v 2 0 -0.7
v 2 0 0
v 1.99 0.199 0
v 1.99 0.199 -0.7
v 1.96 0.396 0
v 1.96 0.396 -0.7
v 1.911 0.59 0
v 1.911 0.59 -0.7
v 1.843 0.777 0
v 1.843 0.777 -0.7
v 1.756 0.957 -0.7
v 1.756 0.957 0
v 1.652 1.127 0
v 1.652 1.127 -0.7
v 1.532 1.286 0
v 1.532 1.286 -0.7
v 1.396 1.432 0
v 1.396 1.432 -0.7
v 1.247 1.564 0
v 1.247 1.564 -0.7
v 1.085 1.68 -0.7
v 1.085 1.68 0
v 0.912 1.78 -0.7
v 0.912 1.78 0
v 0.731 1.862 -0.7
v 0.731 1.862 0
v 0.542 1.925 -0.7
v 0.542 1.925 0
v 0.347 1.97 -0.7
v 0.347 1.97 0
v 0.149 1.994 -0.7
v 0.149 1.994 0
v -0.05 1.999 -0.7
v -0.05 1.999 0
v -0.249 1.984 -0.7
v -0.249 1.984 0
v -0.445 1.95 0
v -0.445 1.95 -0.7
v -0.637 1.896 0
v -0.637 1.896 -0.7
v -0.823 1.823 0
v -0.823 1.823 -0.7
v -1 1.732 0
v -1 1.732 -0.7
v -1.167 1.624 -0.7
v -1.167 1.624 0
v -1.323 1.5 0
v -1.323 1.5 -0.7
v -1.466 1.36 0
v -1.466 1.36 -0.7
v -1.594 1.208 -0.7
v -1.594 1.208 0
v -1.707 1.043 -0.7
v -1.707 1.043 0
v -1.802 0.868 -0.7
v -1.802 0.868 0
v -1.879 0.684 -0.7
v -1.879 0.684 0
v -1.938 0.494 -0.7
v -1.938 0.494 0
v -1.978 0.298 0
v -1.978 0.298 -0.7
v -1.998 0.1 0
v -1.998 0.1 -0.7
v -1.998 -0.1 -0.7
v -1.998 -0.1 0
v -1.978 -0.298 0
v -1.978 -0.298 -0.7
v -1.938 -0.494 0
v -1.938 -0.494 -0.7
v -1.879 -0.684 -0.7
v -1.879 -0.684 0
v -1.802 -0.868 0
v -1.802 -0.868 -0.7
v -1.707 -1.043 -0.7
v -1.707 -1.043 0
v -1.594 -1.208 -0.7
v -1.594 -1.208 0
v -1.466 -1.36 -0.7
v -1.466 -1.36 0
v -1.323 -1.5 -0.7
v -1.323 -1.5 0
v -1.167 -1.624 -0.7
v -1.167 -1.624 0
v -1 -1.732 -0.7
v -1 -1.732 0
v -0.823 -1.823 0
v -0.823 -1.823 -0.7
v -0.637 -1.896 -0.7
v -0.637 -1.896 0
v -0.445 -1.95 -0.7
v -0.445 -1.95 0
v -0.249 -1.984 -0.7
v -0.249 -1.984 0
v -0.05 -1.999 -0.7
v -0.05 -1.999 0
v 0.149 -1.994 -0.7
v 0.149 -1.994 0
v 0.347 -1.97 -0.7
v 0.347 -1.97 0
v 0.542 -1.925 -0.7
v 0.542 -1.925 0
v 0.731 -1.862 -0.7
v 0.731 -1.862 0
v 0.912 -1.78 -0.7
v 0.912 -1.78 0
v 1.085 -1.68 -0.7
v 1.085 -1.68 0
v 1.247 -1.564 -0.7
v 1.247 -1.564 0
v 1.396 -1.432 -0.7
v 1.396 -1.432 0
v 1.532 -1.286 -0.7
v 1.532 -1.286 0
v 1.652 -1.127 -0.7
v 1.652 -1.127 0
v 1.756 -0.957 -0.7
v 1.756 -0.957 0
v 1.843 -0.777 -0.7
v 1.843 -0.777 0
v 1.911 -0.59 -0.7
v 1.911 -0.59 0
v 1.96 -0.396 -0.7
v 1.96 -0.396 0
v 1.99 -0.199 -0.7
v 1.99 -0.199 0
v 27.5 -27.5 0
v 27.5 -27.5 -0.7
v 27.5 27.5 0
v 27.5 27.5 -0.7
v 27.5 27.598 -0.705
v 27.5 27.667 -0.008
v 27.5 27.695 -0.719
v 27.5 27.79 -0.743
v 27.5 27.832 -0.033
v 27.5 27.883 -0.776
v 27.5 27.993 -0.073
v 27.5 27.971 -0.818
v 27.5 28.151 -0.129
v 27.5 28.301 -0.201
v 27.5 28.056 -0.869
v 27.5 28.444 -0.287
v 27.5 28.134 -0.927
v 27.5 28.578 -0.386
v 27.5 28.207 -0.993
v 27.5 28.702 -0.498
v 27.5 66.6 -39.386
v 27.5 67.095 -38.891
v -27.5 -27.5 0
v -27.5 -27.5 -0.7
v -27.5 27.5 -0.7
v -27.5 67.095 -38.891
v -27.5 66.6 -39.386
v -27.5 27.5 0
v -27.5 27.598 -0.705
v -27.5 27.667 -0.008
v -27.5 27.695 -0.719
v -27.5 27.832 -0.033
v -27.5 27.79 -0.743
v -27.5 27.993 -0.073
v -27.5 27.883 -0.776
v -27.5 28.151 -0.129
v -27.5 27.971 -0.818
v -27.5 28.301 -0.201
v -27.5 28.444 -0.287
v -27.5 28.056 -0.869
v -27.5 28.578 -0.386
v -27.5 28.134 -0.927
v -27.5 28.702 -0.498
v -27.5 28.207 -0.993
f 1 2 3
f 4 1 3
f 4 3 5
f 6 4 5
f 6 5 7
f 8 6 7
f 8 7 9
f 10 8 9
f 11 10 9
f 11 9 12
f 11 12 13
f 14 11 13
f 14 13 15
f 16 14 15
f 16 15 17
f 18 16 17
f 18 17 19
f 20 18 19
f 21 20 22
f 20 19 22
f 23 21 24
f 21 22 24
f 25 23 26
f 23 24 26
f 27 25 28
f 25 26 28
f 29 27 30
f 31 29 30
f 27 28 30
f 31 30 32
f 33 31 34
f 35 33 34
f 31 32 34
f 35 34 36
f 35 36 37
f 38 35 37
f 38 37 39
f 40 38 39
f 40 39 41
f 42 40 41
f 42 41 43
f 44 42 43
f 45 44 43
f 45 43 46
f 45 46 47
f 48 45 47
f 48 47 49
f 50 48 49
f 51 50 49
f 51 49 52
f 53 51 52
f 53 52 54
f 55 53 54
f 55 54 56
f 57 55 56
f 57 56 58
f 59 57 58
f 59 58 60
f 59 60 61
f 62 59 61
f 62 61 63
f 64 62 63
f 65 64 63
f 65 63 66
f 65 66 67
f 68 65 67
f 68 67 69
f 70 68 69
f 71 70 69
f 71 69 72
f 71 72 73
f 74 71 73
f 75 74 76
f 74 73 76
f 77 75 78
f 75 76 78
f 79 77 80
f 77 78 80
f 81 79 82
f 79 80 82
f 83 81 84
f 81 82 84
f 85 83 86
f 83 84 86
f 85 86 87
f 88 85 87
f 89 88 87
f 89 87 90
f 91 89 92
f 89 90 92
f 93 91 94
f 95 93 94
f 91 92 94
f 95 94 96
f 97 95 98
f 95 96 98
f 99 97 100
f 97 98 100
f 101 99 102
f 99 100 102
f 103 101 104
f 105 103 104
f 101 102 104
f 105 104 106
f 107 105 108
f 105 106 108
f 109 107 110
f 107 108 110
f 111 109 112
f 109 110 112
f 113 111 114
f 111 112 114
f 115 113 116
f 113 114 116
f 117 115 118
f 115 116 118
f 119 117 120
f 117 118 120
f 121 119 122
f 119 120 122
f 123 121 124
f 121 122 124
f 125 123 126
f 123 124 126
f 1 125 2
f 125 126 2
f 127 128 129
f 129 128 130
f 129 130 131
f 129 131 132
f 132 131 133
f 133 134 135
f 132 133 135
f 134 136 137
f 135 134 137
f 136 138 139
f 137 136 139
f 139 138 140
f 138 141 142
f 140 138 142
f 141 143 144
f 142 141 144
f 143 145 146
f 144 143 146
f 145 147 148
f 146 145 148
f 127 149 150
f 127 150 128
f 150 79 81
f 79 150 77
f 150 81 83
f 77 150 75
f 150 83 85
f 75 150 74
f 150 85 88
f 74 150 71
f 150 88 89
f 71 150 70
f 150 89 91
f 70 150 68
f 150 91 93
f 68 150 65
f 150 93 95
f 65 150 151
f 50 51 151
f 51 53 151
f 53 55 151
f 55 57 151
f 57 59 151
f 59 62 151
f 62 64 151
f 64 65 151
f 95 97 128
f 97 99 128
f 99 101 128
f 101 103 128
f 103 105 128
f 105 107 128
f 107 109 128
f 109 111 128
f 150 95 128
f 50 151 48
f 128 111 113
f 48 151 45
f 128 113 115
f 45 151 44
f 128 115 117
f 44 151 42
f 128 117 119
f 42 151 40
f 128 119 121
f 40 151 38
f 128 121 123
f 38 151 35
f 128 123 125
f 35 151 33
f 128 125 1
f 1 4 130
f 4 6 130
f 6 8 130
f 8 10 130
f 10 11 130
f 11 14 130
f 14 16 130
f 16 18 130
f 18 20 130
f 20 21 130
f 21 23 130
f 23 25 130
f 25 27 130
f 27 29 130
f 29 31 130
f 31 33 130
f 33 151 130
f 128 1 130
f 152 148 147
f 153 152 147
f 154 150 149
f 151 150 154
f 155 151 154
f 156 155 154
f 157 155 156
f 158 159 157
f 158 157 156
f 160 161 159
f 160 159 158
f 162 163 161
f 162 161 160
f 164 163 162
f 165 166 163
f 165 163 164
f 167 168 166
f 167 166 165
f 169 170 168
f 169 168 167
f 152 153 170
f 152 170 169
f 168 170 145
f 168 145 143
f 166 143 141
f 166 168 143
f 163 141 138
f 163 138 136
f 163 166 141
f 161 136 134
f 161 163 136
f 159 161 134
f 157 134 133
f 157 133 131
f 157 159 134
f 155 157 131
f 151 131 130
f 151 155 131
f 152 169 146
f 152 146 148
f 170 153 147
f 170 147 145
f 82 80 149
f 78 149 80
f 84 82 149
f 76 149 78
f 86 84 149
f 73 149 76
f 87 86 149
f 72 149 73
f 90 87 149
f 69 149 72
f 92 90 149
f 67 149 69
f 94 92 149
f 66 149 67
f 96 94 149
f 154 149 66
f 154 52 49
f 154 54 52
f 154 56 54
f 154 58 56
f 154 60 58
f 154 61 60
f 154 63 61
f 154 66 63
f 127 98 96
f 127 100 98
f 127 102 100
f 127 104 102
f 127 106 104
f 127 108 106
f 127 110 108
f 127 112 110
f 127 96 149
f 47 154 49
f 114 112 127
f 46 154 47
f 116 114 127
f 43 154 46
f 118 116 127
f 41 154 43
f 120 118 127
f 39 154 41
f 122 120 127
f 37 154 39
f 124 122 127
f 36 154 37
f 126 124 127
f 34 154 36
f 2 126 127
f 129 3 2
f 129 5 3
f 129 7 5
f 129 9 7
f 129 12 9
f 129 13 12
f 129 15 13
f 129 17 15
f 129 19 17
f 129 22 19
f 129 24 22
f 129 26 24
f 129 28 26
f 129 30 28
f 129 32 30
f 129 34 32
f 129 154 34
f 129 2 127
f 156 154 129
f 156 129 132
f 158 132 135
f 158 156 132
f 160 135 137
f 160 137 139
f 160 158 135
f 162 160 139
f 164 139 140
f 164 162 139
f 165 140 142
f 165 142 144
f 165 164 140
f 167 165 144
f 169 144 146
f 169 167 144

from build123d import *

# Parameters (mm, degrees)
SKETCH1_W          = 55
SKETCH1_H          = 55
BASE_FLANGE1_DEPTH = 0.7
EDGE_FLANGE1_DEPTH = 55
SKETCH10_R         = 2
CUT_EXTRUDE1_DEPTH = 10


# Sheet-metal steps are written as plain solids
with BuildPart() as part:
    # Sketch1 → Base-Flange1 (new body)
    with BuildSketch(Plane.XY):
        Rectangle(SKETCH1_W, SKETCH1_H)
    extrude(amount=-BASE_FLANGE1_DEPTH)

    # Edge-Flange1 section (across the edge) → Edge-Flange1 (add)
    with BuildSketch(Plane(origin=(-27.5, 27.914213562, -0.7), x_dir=(0, -0.7071067811865438, -0.7071067811865512), z_dir=(1, 0, 0))):
        with BuildLine():
            Line((-0.7, 0.414213562), (-0.7, 54.710050506))
            Line((-0.7, 54.710050506), (0, 54.710050506))
            Line((0, 54.710050506), (0, 0.414213562))
            ThreePointArc((0, 0.414213562), (0.076120467, 0.03153013), (0.292893219, -0.292893219))
            Line((0.292893219, -0.292893219), (-0.202081528, -0.787867966))
            ThreePointArc((-0.202081528, -0.787867966), (-0.570595205, -0.236348273), (-0.7, 0.414213562))
        make_face()
    extrude(amount=EDGE_FLANGE1_DEPTH)

    # Sketch10 → Cut-Extrude1 (cut)
    with BuildSketch(Plane.XY):
        Circle(SKETCH10_R)
    extrude(amount=-CUT_EXTRUDE1_DEPTH, mode=Mode.SUBTRACT)


solid = part.part
